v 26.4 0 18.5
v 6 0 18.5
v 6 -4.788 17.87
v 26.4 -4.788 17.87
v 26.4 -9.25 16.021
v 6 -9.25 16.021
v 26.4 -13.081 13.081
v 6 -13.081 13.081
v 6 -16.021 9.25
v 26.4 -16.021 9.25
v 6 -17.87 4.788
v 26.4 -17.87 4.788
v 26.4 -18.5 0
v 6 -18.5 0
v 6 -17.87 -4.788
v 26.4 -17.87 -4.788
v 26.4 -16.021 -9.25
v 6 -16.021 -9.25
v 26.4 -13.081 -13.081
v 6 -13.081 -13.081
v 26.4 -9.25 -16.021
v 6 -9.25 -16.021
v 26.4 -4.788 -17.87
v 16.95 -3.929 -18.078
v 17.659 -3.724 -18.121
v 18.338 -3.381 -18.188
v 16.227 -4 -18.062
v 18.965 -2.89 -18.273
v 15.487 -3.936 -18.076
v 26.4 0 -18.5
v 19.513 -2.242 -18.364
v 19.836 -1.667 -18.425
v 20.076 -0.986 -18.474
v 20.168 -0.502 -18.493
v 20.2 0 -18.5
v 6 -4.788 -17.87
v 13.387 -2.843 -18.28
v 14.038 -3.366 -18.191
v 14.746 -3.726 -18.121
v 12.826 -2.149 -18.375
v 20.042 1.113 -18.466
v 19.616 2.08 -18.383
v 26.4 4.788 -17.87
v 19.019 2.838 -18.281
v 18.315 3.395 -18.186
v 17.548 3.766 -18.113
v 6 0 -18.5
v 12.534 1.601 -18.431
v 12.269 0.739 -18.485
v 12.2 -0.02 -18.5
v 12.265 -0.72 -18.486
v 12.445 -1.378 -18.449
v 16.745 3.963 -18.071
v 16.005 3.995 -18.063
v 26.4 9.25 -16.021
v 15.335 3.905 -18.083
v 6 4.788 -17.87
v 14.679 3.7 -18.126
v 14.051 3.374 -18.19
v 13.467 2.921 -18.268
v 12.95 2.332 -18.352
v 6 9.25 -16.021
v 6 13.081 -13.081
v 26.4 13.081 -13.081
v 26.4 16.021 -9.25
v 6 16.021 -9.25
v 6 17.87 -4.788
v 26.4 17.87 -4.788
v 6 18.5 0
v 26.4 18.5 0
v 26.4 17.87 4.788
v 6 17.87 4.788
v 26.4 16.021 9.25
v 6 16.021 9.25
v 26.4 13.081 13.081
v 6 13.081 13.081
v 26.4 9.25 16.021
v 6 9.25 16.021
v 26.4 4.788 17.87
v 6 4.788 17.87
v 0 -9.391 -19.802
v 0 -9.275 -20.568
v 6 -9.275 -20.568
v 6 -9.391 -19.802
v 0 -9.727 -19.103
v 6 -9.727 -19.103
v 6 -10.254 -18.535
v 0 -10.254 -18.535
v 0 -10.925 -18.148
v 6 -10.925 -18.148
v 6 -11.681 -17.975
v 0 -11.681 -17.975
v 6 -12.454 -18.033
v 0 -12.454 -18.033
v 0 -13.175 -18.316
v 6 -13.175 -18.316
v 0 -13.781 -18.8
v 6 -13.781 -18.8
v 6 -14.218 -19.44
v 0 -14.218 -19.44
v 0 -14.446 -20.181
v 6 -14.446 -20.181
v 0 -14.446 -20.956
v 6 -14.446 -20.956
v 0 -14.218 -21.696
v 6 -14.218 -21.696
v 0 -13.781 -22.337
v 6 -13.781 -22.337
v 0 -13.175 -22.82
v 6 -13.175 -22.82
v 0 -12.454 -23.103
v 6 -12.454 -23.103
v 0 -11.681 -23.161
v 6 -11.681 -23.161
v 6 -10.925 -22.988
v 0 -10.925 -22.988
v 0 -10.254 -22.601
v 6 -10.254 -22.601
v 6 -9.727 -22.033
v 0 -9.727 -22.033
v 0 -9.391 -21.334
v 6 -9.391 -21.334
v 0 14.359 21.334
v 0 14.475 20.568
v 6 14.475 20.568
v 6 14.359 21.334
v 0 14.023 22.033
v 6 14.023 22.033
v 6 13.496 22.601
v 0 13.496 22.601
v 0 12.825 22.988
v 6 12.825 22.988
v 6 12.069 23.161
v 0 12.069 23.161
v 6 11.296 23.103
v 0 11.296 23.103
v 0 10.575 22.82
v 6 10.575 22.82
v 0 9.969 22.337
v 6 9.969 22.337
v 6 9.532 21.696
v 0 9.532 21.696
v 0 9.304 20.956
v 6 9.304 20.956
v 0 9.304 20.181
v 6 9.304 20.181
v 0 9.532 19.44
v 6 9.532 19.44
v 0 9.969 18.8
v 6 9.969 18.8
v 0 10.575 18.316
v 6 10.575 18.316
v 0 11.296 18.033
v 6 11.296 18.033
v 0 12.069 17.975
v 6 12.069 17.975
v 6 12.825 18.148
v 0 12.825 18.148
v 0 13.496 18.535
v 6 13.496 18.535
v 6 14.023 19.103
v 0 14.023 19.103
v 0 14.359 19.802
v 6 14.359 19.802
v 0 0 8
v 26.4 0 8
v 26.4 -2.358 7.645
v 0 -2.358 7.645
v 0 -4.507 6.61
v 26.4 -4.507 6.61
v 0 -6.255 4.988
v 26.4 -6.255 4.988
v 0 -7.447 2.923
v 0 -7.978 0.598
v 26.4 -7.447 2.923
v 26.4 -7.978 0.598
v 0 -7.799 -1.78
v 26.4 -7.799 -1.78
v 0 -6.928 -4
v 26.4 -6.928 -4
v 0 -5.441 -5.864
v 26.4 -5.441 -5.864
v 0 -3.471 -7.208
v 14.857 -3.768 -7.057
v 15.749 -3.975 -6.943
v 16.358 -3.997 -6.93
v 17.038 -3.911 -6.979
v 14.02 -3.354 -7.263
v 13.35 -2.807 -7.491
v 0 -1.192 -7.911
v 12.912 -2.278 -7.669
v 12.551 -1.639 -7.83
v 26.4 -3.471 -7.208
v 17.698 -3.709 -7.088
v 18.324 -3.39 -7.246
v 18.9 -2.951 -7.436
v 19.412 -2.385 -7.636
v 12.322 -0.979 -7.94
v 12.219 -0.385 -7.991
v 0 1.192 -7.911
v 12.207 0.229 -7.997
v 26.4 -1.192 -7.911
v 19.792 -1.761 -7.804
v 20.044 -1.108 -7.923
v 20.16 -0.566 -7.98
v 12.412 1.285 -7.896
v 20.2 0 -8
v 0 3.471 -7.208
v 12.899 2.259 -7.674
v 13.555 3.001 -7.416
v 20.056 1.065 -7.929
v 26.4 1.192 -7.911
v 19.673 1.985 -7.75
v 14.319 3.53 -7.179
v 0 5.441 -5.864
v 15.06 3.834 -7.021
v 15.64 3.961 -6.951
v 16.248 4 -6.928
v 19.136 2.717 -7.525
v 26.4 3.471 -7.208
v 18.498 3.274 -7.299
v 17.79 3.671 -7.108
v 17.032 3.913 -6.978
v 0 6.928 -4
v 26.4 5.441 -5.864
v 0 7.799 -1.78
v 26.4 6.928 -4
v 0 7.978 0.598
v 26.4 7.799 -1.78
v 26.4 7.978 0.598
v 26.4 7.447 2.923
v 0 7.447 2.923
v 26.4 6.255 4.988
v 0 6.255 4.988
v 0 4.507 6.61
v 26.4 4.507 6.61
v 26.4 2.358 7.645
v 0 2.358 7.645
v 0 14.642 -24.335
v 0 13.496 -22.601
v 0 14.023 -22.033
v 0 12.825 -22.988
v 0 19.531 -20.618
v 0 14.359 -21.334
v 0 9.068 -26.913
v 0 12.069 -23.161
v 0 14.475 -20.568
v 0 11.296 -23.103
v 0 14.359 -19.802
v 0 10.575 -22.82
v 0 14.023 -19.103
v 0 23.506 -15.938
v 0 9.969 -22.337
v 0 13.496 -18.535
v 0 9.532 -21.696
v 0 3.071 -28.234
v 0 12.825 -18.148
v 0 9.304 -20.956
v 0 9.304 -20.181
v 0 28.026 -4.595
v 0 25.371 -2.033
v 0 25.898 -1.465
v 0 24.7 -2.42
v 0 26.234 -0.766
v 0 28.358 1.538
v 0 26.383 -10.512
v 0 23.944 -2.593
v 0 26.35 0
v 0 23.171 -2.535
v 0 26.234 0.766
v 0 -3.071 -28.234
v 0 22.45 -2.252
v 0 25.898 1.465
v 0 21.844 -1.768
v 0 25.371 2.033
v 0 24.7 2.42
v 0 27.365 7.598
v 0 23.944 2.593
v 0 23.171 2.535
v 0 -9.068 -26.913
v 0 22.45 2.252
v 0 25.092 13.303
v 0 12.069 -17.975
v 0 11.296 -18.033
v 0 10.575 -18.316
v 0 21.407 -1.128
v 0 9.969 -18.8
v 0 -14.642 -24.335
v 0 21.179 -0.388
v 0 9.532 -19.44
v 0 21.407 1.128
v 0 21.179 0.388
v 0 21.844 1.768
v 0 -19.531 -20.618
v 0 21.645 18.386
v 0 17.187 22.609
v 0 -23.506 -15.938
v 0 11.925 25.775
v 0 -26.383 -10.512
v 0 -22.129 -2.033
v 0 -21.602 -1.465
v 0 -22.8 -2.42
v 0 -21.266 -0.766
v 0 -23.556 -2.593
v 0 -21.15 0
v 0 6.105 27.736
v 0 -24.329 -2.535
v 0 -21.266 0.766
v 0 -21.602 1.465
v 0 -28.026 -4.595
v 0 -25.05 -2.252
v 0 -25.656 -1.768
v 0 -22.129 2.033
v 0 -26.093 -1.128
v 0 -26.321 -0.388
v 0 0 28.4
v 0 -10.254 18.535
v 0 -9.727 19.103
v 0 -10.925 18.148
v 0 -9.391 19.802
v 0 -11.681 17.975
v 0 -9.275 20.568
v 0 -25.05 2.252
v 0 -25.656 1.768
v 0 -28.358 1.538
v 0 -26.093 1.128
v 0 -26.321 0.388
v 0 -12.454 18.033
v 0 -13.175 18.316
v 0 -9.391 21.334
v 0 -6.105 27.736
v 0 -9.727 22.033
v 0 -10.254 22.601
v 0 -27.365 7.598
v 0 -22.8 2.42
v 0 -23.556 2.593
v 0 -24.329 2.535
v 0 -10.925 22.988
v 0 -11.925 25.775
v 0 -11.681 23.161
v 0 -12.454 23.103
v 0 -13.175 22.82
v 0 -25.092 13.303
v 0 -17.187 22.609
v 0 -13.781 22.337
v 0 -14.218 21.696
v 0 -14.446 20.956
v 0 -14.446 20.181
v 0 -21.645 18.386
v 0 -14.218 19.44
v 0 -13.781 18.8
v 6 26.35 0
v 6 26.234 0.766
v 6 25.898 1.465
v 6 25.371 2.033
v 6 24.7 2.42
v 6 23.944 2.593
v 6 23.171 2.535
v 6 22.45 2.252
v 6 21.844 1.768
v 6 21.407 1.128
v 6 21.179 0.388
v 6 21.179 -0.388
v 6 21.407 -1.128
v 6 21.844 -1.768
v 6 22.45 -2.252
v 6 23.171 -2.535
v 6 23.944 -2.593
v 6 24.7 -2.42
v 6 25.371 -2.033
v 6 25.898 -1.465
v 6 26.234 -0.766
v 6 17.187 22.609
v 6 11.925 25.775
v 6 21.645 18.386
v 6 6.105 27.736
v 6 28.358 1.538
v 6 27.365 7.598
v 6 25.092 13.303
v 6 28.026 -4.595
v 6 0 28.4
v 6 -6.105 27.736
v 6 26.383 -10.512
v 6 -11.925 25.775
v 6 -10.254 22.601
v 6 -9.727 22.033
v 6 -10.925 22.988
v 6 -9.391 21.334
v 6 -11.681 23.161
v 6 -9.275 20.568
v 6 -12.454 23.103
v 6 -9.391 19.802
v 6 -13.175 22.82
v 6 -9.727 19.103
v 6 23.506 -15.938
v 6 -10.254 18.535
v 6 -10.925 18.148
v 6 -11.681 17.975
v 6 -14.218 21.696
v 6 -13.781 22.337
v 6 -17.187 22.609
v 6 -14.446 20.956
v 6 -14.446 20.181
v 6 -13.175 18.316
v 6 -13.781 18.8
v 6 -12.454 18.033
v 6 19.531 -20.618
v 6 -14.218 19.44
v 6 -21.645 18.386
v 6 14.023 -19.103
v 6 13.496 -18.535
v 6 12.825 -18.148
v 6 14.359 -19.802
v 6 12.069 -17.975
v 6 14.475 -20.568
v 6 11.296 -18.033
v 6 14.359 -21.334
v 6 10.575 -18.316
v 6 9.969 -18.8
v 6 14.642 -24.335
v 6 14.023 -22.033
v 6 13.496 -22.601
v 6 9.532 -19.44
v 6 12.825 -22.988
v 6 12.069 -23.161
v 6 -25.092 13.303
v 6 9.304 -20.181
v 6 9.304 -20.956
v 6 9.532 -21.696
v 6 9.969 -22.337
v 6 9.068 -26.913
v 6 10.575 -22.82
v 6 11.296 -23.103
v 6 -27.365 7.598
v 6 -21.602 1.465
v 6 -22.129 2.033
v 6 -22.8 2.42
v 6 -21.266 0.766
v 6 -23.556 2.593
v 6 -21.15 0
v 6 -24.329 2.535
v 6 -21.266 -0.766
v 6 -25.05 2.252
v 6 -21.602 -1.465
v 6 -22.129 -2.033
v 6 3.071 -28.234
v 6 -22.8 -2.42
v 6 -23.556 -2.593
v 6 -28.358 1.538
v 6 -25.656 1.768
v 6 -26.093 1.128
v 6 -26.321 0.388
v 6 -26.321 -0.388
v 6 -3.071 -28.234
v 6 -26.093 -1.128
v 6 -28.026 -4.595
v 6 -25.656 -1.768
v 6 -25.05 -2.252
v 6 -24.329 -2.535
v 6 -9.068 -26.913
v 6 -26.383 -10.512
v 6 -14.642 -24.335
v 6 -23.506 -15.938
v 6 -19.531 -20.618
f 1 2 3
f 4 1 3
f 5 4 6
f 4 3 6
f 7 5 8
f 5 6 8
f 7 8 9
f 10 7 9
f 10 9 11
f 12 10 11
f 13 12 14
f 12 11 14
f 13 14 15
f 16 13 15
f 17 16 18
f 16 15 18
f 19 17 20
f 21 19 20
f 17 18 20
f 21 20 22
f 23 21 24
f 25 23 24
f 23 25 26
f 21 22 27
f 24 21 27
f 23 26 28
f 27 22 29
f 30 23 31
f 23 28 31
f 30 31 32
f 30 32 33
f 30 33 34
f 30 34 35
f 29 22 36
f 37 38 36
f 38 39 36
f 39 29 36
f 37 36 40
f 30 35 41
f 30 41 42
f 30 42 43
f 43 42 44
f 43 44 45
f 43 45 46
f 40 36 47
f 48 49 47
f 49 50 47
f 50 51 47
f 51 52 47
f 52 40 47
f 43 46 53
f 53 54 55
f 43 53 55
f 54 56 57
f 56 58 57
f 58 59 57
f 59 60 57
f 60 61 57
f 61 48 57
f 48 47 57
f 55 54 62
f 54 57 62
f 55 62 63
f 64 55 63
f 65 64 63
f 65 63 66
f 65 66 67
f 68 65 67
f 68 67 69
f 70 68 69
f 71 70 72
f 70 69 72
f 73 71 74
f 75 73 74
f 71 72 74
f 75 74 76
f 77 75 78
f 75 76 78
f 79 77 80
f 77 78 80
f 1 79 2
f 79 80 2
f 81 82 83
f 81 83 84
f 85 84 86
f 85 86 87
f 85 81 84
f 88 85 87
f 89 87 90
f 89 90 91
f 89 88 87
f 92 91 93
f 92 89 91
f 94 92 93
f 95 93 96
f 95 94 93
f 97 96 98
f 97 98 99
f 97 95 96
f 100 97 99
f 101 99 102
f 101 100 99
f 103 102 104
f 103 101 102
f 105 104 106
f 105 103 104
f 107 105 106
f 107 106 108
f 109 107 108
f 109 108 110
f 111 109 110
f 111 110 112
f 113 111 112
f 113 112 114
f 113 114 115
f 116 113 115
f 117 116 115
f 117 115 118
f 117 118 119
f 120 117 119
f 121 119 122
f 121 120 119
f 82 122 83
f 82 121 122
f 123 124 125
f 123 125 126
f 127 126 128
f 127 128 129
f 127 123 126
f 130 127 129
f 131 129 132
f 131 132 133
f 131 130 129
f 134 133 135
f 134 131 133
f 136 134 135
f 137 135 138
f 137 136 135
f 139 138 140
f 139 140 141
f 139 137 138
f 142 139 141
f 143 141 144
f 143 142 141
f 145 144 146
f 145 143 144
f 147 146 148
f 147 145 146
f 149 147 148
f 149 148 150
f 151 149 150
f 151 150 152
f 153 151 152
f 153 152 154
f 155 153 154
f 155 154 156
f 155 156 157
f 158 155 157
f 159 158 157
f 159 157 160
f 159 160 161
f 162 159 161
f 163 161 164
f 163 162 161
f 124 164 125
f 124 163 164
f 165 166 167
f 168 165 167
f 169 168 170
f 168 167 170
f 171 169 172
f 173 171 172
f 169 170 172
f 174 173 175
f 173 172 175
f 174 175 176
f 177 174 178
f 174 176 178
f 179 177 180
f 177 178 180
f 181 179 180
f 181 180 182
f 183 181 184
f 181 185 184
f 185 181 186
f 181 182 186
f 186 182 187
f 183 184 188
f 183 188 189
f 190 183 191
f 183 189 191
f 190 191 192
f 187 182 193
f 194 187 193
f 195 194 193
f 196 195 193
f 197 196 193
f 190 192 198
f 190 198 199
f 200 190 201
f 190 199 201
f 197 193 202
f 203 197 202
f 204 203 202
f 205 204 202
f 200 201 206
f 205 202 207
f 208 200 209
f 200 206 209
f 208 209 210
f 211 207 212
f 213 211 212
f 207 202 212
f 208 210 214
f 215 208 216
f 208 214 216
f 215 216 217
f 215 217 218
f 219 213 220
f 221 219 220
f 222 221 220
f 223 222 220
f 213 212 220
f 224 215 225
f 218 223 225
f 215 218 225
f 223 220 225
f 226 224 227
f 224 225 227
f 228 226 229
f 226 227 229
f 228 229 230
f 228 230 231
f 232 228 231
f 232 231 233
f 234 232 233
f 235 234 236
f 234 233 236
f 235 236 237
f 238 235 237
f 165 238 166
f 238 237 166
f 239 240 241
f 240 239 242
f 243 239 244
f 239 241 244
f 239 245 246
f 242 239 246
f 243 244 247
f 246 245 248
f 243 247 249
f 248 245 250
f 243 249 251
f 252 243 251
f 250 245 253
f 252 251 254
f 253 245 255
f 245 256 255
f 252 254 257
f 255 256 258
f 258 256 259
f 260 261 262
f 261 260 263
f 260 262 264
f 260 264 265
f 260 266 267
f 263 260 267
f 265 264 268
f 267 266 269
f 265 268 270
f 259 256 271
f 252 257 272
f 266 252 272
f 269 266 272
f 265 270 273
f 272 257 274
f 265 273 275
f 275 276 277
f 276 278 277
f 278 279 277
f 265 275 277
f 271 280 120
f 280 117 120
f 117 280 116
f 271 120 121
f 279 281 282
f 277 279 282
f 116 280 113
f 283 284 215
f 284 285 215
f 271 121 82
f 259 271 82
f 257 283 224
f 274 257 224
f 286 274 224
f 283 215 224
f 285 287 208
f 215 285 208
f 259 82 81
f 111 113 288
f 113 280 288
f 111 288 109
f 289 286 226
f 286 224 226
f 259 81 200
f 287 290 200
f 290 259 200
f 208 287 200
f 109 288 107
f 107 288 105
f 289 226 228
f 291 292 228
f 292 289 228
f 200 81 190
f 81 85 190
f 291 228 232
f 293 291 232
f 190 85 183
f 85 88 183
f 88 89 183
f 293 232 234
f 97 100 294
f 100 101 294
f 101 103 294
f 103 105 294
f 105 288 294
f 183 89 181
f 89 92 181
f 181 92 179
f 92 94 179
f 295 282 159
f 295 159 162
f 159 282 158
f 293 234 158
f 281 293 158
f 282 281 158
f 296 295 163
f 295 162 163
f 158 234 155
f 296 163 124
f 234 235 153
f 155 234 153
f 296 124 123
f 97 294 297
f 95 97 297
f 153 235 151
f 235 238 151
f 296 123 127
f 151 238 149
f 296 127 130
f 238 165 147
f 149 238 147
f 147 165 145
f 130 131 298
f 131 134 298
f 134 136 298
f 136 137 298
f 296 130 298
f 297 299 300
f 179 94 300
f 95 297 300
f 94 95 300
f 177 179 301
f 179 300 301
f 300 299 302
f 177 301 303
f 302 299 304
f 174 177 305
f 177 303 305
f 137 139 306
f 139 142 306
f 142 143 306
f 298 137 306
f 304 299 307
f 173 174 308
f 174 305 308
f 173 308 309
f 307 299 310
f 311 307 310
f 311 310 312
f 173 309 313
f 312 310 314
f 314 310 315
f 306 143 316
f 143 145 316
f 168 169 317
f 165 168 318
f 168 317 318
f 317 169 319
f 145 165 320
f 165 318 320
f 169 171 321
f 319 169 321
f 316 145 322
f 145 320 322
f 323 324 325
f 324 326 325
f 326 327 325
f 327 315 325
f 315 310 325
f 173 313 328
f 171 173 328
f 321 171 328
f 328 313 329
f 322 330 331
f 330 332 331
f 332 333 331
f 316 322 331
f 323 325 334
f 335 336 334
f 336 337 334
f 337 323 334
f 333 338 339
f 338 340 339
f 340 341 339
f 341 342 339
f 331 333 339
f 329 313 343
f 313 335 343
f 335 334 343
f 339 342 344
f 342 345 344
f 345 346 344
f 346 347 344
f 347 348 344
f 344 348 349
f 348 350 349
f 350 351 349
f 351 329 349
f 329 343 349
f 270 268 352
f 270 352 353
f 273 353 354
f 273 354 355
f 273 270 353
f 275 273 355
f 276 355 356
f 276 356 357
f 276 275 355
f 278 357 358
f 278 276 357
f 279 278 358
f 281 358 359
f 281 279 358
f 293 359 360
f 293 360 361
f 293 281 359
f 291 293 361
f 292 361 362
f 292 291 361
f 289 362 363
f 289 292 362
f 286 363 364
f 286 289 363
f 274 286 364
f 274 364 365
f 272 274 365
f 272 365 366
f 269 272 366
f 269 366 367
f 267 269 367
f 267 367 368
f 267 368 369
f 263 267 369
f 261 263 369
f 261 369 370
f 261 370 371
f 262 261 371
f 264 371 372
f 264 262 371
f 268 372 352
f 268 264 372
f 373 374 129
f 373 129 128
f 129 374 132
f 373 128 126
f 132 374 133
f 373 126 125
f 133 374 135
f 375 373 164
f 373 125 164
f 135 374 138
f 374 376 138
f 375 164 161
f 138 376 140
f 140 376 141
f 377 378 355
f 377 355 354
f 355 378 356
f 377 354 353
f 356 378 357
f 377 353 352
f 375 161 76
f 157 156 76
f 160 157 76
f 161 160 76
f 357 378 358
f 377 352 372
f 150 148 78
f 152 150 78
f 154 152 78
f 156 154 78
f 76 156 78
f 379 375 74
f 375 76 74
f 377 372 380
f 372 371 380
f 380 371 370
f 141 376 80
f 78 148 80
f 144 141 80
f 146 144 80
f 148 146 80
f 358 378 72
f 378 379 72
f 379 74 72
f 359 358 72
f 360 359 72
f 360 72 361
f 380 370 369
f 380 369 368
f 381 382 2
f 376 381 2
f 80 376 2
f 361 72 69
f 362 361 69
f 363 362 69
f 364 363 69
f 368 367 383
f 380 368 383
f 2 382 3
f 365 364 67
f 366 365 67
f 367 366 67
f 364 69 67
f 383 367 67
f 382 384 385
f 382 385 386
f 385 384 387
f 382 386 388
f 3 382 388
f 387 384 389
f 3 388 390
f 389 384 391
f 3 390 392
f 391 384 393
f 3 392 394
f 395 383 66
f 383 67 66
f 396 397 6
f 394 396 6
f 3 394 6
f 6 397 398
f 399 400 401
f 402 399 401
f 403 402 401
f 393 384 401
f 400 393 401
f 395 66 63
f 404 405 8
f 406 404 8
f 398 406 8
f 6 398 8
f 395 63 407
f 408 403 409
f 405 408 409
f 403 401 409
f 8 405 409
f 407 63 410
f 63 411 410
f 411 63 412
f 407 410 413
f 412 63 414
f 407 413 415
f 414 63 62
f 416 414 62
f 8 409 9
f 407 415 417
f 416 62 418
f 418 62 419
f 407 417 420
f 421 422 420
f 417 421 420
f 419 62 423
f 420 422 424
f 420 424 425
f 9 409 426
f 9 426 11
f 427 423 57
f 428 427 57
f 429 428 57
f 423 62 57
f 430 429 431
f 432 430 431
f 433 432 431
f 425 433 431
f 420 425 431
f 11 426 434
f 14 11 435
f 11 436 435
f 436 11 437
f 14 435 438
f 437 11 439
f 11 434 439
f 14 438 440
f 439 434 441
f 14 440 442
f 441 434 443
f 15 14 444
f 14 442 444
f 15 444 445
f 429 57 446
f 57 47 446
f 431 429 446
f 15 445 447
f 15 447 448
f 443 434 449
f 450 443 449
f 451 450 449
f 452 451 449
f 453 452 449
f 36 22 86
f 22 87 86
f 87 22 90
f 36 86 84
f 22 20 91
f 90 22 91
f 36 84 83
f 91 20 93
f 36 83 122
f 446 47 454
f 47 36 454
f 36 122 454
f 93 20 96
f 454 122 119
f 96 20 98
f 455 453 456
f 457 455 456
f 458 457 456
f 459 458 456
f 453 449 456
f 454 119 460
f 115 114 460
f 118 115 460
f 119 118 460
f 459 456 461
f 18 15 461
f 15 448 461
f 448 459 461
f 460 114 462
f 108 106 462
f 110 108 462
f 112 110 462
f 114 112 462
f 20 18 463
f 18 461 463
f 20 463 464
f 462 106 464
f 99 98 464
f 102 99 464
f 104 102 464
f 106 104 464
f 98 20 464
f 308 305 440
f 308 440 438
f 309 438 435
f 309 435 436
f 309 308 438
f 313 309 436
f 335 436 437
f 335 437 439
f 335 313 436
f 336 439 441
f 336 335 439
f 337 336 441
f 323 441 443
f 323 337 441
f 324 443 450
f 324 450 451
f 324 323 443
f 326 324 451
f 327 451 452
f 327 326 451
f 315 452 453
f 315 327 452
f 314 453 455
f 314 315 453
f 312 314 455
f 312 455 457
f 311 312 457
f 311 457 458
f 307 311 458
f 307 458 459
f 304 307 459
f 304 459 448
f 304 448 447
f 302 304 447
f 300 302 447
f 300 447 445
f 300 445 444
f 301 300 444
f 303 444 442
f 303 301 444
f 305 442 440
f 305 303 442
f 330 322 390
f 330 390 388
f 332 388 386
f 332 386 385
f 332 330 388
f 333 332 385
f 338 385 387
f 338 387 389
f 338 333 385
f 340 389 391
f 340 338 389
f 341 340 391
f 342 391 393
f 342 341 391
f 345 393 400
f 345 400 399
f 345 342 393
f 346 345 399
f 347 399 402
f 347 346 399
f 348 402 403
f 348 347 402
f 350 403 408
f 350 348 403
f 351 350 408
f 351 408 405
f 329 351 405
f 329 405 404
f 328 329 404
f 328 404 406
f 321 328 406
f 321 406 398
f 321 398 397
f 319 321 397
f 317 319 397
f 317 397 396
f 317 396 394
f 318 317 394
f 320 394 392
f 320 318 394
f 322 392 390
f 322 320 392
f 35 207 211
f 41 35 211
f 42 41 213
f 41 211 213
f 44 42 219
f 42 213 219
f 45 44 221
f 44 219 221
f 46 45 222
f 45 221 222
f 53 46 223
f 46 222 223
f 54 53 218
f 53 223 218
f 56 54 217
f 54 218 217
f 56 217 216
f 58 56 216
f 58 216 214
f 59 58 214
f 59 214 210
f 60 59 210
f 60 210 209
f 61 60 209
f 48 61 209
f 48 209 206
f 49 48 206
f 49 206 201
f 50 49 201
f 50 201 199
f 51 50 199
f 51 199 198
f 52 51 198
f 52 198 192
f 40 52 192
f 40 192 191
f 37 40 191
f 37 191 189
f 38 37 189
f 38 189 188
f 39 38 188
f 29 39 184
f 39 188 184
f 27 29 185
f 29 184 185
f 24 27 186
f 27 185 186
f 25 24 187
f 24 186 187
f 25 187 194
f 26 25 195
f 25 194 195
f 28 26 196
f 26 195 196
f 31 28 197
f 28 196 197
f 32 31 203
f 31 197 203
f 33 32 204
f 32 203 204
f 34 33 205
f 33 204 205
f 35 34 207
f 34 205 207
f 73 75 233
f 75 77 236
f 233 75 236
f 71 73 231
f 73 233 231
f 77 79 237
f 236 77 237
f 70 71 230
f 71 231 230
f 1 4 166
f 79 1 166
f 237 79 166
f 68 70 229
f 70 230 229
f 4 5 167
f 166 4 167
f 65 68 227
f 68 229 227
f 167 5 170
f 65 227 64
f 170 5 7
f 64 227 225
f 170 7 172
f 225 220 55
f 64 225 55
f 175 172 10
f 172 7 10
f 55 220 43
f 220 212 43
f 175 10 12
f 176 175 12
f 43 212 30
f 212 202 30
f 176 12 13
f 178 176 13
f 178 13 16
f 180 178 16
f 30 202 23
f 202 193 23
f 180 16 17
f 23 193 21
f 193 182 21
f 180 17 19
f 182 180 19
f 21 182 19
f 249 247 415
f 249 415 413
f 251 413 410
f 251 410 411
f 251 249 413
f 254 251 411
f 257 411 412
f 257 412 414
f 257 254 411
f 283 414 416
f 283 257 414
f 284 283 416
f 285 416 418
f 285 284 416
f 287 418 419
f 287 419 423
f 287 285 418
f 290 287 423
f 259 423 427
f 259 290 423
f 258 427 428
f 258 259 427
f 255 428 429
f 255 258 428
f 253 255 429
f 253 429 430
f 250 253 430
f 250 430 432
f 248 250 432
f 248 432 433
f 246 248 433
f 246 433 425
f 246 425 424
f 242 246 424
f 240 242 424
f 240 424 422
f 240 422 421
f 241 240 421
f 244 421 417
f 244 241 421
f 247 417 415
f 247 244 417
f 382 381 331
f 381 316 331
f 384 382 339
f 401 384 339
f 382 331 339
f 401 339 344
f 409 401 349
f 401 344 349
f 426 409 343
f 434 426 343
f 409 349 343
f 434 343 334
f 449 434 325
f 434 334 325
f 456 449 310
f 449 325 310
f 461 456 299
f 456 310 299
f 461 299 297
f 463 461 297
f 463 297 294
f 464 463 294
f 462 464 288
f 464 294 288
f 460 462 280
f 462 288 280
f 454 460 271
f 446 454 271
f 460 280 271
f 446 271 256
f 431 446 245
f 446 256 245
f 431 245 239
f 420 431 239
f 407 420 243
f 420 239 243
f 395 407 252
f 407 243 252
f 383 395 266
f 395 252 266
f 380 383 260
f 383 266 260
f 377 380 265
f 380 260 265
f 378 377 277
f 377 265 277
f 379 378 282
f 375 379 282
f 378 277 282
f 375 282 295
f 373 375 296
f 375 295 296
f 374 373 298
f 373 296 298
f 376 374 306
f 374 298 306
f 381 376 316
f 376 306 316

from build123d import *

# Parameters (mm, degrees)
F2_R     = 2.6
F3_DEPTH = 6
F4_R     = 4
F5_DEPTH = 28.401


with BuildPart() as f1:
    # F0 (on Front) → F1 (revolve)
    with BuildSketch(Plane.XZ):
        Polygon((0, 28.4), (0, 8), (26.4, 8), (26.4, 18.5), (6, 18.5), (6, 28.4), align=None)
    revolve(axis=Axis((58.458176, 0, 0), (1, 0, 0)))

    # F2 (on Right) → F3 (cut, through all)
    with BuildSketch(Plane.YZ):
        with Locations((11.875, 20.568103)):
            Circle(F2_R)
        with Locations((23.75, 0)):
            Circle(F2_R)
        with Locations((11.875, -20.568103)):
            Circle(F2_R)
        with Locations((-11.875, -20.568103)):
            Circle(F2_R)
        with Locations((-23.75, 0)):
            Circle(F2_R)
        with Locations((-11.875, 20.568103)):
            Circle(F2_R)
    extrude(amount=F3_DEPTH, mode=Mode.SUBTRACT)

    # F4 (on Top) → F5 (cut, through all)
    with BuildSketch(Plane.XY):
        with Locations((16.2, 0)):
            Circle(F4_R)
    extrude(amount=-F5_DEPTH, mode=Mode.SUBTRACT)


solid = f1.part
